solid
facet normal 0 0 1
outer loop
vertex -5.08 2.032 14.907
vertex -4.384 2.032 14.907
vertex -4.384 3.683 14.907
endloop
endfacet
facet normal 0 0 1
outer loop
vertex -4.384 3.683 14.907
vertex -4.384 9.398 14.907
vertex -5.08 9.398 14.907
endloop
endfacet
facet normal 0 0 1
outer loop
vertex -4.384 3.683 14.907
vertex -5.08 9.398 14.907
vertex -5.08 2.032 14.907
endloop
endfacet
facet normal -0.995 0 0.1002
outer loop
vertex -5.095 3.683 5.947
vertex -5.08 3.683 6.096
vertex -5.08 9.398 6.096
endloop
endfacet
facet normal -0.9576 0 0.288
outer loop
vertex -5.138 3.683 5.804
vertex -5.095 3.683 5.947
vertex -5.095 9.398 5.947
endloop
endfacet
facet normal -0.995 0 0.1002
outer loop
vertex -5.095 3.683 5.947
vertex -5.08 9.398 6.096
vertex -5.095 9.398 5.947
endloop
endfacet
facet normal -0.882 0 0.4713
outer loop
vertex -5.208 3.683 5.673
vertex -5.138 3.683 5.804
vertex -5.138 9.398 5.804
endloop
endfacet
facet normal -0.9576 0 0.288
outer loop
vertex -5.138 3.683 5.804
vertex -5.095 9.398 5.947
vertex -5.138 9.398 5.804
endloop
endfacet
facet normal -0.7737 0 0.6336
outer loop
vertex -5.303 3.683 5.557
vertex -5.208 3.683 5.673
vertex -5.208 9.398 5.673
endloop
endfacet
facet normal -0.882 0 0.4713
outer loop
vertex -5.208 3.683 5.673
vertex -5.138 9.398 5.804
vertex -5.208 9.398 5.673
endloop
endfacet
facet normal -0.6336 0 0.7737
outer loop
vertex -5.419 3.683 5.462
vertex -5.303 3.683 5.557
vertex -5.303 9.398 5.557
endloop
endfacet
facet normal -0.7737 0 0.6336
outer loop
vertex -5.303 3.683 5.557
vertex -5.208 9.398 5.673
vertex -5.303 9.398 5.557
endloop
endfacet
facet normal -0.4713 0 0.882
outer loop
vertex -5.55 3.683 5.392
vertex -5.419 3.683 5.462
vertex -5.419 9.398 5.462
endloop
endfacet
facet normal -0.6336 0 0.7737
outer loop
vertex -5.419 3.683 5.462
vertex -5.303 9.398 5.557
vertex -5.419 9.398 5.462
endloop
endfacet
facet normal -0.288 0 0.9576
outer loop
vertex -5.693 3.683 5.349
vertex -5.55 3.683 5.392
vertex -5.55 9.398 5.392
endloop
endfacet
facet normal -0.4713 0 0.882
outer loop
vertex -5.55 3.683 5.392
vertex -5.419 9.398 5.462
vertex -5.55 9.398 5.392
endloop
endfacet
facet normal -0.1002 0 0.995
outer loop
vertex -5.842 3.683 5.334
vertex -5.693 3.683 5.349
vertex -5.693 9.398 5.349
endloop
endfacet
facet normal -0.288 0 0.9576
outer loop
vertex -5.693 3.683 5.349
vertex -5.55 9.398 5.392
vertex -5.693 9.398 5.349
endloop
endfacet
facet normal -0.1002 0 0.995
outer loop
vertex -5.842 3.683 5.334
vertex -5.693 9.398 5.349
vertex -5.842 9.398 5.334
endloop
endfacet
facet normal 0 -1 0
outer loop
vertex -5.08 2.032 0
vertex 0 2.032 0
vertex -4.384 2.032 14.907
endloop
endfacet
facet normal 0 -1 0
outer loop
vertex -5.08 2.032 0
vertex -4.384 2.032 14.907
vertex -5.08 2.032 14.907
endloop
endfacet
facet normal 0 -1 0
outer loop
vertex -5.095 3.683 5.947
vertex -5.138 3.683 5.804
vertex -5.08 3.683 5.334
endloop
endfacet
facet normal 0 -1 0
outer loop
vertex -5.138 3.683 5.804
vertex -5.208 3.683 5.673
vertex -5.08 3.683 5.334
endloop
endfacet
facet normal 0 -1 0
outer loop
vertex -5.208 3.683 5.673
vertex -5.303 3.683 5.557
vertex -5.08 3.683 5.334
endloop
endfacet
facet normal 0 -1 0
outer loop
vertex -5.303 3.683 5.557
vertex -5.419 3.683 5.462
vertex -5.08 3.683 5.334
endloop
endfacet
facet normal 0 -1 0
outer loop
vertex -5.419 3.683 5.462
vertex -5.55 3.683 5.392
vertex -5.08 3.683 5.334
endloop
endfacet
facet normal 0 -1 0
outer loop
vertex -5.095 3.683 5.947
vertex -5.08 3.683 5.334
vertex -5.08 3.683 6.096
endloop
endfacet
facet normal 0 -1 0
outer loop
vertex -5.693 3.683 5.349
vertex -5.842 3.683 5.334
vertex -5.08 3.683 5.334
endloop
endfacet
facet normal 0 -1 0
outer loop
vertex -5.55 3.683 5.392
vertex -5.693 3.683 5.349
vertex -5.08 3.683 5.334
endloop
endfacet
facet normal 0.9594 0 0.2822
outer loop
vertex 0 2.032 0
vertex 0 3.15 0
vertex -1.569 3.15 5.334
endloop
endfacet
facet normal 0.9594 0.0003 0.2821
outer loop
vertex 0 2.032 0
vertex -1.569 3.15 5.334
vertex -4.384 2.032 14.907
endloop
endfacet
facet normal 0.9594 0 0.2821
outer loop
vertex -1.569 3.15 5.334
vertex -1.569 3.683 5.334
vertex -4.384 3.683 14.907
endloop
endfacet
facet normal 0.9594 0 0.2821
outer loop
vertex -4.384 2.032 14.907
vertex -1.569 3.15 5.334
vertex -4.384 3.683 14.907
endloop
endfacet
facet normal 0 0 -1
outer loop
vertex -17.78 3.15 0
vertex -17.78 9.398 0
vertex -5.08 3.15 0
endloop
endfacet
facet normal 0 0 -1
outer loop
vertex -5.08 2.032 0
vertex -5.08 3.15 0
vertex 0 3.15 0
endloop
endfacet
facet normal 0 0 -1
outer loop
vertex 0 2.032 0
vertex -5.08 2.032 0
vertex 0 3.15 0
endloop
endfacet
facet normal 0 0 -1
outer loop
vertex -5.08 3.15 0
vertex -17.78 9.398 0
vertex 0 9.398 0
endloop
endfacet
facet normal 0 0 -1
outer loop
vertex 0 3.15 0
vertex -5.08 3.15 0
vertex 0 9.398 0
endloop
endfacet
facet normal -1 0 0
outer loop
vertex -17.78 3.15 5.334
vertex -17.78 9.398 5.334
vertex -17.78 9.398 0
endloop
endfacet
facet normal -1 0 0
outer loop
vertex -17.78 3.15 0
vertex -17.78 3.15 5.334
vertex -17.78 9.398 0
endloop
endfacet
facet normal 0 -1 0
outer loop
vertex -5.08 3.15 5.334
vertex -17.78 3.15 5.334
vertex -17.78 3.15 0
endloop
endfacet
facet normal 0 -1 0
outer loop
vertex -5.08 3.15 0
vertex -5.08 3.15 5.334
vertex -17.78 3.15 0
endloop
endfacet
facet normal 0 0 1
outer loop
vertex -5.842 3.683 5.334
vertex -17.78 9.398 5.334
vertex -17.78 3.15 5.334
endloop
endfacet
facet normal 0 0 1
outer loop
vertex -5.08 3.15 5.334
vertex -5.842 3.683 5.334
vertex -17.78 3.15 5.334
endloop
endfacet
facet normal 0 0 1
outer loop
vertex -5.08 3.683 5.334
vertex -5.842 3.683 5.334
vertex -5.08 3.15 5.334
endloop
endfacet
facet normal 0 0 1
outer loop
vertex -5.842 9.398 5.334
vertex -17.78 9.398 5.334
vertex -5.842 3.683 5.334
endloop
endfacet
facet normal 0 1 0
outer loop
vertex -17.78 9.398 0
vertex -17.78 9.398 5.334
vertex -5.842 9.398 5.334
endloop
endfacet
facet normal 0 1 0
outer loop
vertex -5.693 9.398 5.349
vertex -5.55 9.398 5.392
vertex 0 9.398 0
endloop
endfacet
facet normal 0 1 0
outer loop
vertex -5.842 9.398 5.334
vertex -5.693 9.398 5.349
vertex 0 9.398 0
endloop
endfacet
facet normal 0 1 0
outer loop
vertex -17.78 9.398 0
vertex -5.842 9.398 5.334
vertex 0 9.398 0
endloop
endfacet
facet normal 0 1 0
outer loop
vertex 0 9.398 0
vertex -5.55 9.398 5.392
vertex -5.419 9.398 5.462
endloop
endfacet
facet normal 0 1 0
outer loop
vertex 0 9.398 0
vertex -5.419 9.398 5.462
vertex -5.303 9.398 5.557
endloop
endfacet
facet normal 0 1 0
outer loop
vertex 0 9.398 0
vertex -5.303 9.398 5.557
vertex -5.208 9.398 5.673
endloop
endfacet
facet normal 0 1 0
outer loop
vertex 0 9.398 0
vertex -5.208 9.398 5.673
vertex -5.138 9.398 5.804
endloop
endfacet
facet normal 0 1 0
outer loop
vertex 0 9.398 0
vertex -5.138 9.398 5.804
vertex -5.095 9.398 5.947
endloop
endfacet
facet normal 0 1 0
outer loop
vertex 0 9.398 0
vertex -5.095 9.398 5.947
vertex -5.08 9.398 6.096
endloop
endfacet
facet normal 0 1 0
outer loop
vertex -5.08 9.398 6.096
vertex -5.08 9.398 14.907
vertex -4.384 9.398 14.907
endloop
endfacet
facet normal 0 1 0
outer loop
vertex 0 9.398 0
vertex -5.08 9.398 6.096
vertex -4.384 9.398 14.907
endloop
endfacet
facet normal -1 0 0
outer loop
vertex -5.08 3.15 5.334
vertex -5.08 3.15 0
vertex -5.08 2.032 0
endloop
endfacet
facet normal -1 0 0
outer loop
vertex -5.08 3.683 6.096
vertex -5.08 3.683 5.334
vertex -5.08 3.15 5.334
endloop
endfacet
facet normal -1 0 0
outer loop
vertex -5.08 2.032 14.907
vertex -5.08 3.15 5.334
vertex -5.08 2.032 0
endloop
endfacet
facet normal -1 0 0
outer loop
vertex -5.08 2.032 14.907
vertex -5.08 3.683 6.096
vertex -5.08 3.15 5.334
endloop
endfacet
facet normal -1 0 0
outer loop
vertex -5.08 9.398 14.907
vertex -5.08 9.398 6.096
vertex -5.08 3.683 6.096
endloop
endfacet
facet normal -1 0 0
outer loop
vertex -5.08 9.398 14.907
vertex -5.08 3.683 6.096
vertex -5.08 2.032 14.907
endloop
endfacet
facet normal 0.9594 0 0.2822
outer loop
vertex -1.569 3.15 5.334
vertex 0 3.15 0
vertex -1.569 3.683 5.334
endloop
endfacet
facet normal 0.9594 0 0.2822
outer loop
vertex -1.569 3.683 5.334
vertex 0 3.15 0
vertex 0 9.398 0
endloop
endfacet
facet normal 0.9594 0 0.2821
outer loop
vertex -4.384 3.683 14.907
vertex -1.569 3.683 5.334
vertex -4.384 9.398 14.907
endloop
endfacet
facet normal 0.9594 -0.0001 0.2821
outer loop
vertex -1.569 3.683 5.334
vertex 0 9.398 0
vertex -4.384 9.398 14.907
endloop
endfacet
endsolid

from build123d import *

# Parameters (mm, degrees)
EXTRUDE1_DEPTH          = 5.334
SKETCH20_W              = 5.08
SKETCH20_H              = 5.715
EXTRUDE3_DEPTH          = 12.7
SKETCH22_W              = 0.889
SKETCH22_H              = 2.54
EXTRUDE5_DEPTH          = 5.334
SKETCH23_W              = 5.08
SKETCH23_H              = 1.5875
EXTRUDE6_DEPTH          = 3.683
FILLET5_R               = 1.6002
FILLET6_R               = 0.8382
FILLET2_R               = 0.762
CUT_EXTRUDE4_DEPTH      = 1
CUT_EXTRUDE4_DEPTH_BACK = 11.922
CUT_EXTRUDE5_DEPTH      = 1
CUT_EXTRUDE5_DEPTH_BACK = 11.922
CUT_EXTRUDE7_DEPTH      = 1
CUT_EXTRUDE7_DEPTH_BACK = 11.922
CUT_EXTRUDE8_DEPTH      = 1
CUT_EXTRUDE8_DEPTH_BACK = 18.78
BOSS_EXTRUDE1_DEPTH     = 7.366


with BuildPart() as part:
    # Sketch2 → Extrude1 (new body)
    with BuildSketch(Plane.XY):
        Polygon((-5.08, 0), (-5.08, -1.524), (0, -1.524), (0, 0), (0, 9.398), (-25.4, 9.398), (-25.4, 0), align=None)
    extrude(amount=EXTRUDE1_DEPTH)

    # Sketch20 → Extrude3 (add)
    with BuildSketch(Plane.XY.offset(5.334)):
        with Locations((-2.54, 6.5405)):
            Rectangle(SKETCH20_W, SKETCH20_H)
    extrude(amount=EXTRUDE3_DEPTH)

    # Sketch22 → Extrude5 (add)
    with BuildSketch(Plane.XY.offset(5.334)):
        with Locations((-25.8445, 8.128)):
            Rectangle(SKETCH22_W, SKETCH22_H)
    extrude(amount=-EXTRUDE5_DEPTH)

    # Sketch23 → Extrude6 (add)
    with BuildSketch(Plane.XZ.offset(-3.683)):
        with Locations((-2.54, 17.24025)):
            Rectangle(SKETCH23_W, SKETCH23_H)
    extrude(amount=EXTRUDE6_DEPTH)

    # Fillet5
    fillet5_edges = [part.edges().sort_by_distance(p)[0] for p in [
        (-26.289, 8.128, 5.334),
    ]]
    fillet(fillet5_edges, radius=FILLET5_R)

    # Fillet6
    fillet6_edges = [part.edges().sort_by_distance(p)[0] for p in [
        (-5.08, 1.8415, 16.4465),
    ]]
    fillet(fillet6_edges, radius=FILLET6_R)

    # Fillet2
    fillet2_edges = [part.edges().sort_by_distance(p)[0] for p in [
        (-5.08, 6.5405, 5.334),
        (0, 4.699, 18.034),
        (-5.08, 4.699, 18.034),
        (0, 1.0795, 5.334),
    ]]
    fillet(fillet2_edges, radius=FILLET2_R)

    # Sketch26 → Cut-Extrude4 (cut, two sides)
    with BuildSketch(Plane(origin=(0, 9.398, 0), x_dir=(1, 0, 0), z_dir=(0, 1, 0))) as cut_extrude4_sk:
        Polygon((20.812608211, 70.762867918), (0, 0), (-5.08, -17.272), (-25.892608211, -88.034867918), (115.633127624, -129.66008434), (162.338344046, 29.137651496), align=None)
    extrude(amount=CUT_EXTRUDE4_DEPTH, mode=Mode.SUBTRACT)
    extrude(cut_extrude4_sk.sketch, amount=-CUT_EXTRUDE4_DEPTH_BACK, mode=Mode.SUBTRACT)

    # Sketch27 → Cut-Extrude5 (cut, two sides)
    with BuildSketch(Plane(origin=(0, 9.398, 0), x_dir=(1, 0, 0), z_dir=(0, 1, 0))) as cut_extrude5_sk:
        Polygon((-68.071537779, -14.906771648), (-5.08, -14.906771648), (-4.384344602, -14.906771648), (58.607193177, -14.906771648), (58.607193177, -140.889847207), (-68.071537779, -140.889847207), align=None)
    extrude(amount=CUT_EXTRUDE5_DEPTH, mode=Mode.SUBTRACT)
    extrude(cut_extrude5_sk.sketch, amount=-CUT_EXTRUDE5_DEPTH_BACK, mode=Mode.SUBTRACT)

    # Sketch28 → Cut-Extrude7 (cut, two sides)
    with BuildSketch(Plane(origin=(0, 9.398, 0), x_dir=(1, 0, 0), z_dir=(0, 1, 0))) as cut_extrude7_sk:
        Polygon((-17.78, 56.40432053), (-17.78, 0), (-17.78, -5.334), (-17.78, -61.73832053), (-130.588641061, -61.73832053), (-130.588641061, 56.40432053), align=None)
    extrude(amount=CUT_EXTRUDE7_DEPTH, mode=Mode.SUBTRACT)
    extrude(cut_extrude7_sk.sketch, amount=-CUT_EXTRUDE7_DEPTH_BACK, mode=Mode.SUBTRACT)

    # Sketch29 → Cut-Extrude8 (cut, two sides)
    with BuildSketch(Plane.ZY.offset(17.78)) as cut_extrude8_sk:
        Polygon((-42.326728478, 3.1496), (0, 3.1496), (5.334, 3.1496), (47.660728478, 3.1496), (47.660728478, -81.503856957), (-42.326728478, -81.503856957), align=None)
    extrude(amount=CUT_EXTRUDE8_DEPTH, mode=Mode.SUBTRACT)
    extrude(cut_extrude8_sk.sketch, amount=-CUT_EXTRUDE8_DEPTH_BACK, mode=Mode.SUBTRACT)

    # Sketch30 → Boss-Extrude1 (add)
    with BuildSketch(Plane(origin=(0, 9.398, 0), x_dir=(1, 0, 0), z_dir=(0, 1, 0))):
        Polygon((-5.08, -14.906771648), (-5.08, 0), (0, 0), (-4.384344602, -14.906771648), align=None)
    extrude(amount=-BOSS_EXTRUDE1_DEPTH)


solid = part.part
